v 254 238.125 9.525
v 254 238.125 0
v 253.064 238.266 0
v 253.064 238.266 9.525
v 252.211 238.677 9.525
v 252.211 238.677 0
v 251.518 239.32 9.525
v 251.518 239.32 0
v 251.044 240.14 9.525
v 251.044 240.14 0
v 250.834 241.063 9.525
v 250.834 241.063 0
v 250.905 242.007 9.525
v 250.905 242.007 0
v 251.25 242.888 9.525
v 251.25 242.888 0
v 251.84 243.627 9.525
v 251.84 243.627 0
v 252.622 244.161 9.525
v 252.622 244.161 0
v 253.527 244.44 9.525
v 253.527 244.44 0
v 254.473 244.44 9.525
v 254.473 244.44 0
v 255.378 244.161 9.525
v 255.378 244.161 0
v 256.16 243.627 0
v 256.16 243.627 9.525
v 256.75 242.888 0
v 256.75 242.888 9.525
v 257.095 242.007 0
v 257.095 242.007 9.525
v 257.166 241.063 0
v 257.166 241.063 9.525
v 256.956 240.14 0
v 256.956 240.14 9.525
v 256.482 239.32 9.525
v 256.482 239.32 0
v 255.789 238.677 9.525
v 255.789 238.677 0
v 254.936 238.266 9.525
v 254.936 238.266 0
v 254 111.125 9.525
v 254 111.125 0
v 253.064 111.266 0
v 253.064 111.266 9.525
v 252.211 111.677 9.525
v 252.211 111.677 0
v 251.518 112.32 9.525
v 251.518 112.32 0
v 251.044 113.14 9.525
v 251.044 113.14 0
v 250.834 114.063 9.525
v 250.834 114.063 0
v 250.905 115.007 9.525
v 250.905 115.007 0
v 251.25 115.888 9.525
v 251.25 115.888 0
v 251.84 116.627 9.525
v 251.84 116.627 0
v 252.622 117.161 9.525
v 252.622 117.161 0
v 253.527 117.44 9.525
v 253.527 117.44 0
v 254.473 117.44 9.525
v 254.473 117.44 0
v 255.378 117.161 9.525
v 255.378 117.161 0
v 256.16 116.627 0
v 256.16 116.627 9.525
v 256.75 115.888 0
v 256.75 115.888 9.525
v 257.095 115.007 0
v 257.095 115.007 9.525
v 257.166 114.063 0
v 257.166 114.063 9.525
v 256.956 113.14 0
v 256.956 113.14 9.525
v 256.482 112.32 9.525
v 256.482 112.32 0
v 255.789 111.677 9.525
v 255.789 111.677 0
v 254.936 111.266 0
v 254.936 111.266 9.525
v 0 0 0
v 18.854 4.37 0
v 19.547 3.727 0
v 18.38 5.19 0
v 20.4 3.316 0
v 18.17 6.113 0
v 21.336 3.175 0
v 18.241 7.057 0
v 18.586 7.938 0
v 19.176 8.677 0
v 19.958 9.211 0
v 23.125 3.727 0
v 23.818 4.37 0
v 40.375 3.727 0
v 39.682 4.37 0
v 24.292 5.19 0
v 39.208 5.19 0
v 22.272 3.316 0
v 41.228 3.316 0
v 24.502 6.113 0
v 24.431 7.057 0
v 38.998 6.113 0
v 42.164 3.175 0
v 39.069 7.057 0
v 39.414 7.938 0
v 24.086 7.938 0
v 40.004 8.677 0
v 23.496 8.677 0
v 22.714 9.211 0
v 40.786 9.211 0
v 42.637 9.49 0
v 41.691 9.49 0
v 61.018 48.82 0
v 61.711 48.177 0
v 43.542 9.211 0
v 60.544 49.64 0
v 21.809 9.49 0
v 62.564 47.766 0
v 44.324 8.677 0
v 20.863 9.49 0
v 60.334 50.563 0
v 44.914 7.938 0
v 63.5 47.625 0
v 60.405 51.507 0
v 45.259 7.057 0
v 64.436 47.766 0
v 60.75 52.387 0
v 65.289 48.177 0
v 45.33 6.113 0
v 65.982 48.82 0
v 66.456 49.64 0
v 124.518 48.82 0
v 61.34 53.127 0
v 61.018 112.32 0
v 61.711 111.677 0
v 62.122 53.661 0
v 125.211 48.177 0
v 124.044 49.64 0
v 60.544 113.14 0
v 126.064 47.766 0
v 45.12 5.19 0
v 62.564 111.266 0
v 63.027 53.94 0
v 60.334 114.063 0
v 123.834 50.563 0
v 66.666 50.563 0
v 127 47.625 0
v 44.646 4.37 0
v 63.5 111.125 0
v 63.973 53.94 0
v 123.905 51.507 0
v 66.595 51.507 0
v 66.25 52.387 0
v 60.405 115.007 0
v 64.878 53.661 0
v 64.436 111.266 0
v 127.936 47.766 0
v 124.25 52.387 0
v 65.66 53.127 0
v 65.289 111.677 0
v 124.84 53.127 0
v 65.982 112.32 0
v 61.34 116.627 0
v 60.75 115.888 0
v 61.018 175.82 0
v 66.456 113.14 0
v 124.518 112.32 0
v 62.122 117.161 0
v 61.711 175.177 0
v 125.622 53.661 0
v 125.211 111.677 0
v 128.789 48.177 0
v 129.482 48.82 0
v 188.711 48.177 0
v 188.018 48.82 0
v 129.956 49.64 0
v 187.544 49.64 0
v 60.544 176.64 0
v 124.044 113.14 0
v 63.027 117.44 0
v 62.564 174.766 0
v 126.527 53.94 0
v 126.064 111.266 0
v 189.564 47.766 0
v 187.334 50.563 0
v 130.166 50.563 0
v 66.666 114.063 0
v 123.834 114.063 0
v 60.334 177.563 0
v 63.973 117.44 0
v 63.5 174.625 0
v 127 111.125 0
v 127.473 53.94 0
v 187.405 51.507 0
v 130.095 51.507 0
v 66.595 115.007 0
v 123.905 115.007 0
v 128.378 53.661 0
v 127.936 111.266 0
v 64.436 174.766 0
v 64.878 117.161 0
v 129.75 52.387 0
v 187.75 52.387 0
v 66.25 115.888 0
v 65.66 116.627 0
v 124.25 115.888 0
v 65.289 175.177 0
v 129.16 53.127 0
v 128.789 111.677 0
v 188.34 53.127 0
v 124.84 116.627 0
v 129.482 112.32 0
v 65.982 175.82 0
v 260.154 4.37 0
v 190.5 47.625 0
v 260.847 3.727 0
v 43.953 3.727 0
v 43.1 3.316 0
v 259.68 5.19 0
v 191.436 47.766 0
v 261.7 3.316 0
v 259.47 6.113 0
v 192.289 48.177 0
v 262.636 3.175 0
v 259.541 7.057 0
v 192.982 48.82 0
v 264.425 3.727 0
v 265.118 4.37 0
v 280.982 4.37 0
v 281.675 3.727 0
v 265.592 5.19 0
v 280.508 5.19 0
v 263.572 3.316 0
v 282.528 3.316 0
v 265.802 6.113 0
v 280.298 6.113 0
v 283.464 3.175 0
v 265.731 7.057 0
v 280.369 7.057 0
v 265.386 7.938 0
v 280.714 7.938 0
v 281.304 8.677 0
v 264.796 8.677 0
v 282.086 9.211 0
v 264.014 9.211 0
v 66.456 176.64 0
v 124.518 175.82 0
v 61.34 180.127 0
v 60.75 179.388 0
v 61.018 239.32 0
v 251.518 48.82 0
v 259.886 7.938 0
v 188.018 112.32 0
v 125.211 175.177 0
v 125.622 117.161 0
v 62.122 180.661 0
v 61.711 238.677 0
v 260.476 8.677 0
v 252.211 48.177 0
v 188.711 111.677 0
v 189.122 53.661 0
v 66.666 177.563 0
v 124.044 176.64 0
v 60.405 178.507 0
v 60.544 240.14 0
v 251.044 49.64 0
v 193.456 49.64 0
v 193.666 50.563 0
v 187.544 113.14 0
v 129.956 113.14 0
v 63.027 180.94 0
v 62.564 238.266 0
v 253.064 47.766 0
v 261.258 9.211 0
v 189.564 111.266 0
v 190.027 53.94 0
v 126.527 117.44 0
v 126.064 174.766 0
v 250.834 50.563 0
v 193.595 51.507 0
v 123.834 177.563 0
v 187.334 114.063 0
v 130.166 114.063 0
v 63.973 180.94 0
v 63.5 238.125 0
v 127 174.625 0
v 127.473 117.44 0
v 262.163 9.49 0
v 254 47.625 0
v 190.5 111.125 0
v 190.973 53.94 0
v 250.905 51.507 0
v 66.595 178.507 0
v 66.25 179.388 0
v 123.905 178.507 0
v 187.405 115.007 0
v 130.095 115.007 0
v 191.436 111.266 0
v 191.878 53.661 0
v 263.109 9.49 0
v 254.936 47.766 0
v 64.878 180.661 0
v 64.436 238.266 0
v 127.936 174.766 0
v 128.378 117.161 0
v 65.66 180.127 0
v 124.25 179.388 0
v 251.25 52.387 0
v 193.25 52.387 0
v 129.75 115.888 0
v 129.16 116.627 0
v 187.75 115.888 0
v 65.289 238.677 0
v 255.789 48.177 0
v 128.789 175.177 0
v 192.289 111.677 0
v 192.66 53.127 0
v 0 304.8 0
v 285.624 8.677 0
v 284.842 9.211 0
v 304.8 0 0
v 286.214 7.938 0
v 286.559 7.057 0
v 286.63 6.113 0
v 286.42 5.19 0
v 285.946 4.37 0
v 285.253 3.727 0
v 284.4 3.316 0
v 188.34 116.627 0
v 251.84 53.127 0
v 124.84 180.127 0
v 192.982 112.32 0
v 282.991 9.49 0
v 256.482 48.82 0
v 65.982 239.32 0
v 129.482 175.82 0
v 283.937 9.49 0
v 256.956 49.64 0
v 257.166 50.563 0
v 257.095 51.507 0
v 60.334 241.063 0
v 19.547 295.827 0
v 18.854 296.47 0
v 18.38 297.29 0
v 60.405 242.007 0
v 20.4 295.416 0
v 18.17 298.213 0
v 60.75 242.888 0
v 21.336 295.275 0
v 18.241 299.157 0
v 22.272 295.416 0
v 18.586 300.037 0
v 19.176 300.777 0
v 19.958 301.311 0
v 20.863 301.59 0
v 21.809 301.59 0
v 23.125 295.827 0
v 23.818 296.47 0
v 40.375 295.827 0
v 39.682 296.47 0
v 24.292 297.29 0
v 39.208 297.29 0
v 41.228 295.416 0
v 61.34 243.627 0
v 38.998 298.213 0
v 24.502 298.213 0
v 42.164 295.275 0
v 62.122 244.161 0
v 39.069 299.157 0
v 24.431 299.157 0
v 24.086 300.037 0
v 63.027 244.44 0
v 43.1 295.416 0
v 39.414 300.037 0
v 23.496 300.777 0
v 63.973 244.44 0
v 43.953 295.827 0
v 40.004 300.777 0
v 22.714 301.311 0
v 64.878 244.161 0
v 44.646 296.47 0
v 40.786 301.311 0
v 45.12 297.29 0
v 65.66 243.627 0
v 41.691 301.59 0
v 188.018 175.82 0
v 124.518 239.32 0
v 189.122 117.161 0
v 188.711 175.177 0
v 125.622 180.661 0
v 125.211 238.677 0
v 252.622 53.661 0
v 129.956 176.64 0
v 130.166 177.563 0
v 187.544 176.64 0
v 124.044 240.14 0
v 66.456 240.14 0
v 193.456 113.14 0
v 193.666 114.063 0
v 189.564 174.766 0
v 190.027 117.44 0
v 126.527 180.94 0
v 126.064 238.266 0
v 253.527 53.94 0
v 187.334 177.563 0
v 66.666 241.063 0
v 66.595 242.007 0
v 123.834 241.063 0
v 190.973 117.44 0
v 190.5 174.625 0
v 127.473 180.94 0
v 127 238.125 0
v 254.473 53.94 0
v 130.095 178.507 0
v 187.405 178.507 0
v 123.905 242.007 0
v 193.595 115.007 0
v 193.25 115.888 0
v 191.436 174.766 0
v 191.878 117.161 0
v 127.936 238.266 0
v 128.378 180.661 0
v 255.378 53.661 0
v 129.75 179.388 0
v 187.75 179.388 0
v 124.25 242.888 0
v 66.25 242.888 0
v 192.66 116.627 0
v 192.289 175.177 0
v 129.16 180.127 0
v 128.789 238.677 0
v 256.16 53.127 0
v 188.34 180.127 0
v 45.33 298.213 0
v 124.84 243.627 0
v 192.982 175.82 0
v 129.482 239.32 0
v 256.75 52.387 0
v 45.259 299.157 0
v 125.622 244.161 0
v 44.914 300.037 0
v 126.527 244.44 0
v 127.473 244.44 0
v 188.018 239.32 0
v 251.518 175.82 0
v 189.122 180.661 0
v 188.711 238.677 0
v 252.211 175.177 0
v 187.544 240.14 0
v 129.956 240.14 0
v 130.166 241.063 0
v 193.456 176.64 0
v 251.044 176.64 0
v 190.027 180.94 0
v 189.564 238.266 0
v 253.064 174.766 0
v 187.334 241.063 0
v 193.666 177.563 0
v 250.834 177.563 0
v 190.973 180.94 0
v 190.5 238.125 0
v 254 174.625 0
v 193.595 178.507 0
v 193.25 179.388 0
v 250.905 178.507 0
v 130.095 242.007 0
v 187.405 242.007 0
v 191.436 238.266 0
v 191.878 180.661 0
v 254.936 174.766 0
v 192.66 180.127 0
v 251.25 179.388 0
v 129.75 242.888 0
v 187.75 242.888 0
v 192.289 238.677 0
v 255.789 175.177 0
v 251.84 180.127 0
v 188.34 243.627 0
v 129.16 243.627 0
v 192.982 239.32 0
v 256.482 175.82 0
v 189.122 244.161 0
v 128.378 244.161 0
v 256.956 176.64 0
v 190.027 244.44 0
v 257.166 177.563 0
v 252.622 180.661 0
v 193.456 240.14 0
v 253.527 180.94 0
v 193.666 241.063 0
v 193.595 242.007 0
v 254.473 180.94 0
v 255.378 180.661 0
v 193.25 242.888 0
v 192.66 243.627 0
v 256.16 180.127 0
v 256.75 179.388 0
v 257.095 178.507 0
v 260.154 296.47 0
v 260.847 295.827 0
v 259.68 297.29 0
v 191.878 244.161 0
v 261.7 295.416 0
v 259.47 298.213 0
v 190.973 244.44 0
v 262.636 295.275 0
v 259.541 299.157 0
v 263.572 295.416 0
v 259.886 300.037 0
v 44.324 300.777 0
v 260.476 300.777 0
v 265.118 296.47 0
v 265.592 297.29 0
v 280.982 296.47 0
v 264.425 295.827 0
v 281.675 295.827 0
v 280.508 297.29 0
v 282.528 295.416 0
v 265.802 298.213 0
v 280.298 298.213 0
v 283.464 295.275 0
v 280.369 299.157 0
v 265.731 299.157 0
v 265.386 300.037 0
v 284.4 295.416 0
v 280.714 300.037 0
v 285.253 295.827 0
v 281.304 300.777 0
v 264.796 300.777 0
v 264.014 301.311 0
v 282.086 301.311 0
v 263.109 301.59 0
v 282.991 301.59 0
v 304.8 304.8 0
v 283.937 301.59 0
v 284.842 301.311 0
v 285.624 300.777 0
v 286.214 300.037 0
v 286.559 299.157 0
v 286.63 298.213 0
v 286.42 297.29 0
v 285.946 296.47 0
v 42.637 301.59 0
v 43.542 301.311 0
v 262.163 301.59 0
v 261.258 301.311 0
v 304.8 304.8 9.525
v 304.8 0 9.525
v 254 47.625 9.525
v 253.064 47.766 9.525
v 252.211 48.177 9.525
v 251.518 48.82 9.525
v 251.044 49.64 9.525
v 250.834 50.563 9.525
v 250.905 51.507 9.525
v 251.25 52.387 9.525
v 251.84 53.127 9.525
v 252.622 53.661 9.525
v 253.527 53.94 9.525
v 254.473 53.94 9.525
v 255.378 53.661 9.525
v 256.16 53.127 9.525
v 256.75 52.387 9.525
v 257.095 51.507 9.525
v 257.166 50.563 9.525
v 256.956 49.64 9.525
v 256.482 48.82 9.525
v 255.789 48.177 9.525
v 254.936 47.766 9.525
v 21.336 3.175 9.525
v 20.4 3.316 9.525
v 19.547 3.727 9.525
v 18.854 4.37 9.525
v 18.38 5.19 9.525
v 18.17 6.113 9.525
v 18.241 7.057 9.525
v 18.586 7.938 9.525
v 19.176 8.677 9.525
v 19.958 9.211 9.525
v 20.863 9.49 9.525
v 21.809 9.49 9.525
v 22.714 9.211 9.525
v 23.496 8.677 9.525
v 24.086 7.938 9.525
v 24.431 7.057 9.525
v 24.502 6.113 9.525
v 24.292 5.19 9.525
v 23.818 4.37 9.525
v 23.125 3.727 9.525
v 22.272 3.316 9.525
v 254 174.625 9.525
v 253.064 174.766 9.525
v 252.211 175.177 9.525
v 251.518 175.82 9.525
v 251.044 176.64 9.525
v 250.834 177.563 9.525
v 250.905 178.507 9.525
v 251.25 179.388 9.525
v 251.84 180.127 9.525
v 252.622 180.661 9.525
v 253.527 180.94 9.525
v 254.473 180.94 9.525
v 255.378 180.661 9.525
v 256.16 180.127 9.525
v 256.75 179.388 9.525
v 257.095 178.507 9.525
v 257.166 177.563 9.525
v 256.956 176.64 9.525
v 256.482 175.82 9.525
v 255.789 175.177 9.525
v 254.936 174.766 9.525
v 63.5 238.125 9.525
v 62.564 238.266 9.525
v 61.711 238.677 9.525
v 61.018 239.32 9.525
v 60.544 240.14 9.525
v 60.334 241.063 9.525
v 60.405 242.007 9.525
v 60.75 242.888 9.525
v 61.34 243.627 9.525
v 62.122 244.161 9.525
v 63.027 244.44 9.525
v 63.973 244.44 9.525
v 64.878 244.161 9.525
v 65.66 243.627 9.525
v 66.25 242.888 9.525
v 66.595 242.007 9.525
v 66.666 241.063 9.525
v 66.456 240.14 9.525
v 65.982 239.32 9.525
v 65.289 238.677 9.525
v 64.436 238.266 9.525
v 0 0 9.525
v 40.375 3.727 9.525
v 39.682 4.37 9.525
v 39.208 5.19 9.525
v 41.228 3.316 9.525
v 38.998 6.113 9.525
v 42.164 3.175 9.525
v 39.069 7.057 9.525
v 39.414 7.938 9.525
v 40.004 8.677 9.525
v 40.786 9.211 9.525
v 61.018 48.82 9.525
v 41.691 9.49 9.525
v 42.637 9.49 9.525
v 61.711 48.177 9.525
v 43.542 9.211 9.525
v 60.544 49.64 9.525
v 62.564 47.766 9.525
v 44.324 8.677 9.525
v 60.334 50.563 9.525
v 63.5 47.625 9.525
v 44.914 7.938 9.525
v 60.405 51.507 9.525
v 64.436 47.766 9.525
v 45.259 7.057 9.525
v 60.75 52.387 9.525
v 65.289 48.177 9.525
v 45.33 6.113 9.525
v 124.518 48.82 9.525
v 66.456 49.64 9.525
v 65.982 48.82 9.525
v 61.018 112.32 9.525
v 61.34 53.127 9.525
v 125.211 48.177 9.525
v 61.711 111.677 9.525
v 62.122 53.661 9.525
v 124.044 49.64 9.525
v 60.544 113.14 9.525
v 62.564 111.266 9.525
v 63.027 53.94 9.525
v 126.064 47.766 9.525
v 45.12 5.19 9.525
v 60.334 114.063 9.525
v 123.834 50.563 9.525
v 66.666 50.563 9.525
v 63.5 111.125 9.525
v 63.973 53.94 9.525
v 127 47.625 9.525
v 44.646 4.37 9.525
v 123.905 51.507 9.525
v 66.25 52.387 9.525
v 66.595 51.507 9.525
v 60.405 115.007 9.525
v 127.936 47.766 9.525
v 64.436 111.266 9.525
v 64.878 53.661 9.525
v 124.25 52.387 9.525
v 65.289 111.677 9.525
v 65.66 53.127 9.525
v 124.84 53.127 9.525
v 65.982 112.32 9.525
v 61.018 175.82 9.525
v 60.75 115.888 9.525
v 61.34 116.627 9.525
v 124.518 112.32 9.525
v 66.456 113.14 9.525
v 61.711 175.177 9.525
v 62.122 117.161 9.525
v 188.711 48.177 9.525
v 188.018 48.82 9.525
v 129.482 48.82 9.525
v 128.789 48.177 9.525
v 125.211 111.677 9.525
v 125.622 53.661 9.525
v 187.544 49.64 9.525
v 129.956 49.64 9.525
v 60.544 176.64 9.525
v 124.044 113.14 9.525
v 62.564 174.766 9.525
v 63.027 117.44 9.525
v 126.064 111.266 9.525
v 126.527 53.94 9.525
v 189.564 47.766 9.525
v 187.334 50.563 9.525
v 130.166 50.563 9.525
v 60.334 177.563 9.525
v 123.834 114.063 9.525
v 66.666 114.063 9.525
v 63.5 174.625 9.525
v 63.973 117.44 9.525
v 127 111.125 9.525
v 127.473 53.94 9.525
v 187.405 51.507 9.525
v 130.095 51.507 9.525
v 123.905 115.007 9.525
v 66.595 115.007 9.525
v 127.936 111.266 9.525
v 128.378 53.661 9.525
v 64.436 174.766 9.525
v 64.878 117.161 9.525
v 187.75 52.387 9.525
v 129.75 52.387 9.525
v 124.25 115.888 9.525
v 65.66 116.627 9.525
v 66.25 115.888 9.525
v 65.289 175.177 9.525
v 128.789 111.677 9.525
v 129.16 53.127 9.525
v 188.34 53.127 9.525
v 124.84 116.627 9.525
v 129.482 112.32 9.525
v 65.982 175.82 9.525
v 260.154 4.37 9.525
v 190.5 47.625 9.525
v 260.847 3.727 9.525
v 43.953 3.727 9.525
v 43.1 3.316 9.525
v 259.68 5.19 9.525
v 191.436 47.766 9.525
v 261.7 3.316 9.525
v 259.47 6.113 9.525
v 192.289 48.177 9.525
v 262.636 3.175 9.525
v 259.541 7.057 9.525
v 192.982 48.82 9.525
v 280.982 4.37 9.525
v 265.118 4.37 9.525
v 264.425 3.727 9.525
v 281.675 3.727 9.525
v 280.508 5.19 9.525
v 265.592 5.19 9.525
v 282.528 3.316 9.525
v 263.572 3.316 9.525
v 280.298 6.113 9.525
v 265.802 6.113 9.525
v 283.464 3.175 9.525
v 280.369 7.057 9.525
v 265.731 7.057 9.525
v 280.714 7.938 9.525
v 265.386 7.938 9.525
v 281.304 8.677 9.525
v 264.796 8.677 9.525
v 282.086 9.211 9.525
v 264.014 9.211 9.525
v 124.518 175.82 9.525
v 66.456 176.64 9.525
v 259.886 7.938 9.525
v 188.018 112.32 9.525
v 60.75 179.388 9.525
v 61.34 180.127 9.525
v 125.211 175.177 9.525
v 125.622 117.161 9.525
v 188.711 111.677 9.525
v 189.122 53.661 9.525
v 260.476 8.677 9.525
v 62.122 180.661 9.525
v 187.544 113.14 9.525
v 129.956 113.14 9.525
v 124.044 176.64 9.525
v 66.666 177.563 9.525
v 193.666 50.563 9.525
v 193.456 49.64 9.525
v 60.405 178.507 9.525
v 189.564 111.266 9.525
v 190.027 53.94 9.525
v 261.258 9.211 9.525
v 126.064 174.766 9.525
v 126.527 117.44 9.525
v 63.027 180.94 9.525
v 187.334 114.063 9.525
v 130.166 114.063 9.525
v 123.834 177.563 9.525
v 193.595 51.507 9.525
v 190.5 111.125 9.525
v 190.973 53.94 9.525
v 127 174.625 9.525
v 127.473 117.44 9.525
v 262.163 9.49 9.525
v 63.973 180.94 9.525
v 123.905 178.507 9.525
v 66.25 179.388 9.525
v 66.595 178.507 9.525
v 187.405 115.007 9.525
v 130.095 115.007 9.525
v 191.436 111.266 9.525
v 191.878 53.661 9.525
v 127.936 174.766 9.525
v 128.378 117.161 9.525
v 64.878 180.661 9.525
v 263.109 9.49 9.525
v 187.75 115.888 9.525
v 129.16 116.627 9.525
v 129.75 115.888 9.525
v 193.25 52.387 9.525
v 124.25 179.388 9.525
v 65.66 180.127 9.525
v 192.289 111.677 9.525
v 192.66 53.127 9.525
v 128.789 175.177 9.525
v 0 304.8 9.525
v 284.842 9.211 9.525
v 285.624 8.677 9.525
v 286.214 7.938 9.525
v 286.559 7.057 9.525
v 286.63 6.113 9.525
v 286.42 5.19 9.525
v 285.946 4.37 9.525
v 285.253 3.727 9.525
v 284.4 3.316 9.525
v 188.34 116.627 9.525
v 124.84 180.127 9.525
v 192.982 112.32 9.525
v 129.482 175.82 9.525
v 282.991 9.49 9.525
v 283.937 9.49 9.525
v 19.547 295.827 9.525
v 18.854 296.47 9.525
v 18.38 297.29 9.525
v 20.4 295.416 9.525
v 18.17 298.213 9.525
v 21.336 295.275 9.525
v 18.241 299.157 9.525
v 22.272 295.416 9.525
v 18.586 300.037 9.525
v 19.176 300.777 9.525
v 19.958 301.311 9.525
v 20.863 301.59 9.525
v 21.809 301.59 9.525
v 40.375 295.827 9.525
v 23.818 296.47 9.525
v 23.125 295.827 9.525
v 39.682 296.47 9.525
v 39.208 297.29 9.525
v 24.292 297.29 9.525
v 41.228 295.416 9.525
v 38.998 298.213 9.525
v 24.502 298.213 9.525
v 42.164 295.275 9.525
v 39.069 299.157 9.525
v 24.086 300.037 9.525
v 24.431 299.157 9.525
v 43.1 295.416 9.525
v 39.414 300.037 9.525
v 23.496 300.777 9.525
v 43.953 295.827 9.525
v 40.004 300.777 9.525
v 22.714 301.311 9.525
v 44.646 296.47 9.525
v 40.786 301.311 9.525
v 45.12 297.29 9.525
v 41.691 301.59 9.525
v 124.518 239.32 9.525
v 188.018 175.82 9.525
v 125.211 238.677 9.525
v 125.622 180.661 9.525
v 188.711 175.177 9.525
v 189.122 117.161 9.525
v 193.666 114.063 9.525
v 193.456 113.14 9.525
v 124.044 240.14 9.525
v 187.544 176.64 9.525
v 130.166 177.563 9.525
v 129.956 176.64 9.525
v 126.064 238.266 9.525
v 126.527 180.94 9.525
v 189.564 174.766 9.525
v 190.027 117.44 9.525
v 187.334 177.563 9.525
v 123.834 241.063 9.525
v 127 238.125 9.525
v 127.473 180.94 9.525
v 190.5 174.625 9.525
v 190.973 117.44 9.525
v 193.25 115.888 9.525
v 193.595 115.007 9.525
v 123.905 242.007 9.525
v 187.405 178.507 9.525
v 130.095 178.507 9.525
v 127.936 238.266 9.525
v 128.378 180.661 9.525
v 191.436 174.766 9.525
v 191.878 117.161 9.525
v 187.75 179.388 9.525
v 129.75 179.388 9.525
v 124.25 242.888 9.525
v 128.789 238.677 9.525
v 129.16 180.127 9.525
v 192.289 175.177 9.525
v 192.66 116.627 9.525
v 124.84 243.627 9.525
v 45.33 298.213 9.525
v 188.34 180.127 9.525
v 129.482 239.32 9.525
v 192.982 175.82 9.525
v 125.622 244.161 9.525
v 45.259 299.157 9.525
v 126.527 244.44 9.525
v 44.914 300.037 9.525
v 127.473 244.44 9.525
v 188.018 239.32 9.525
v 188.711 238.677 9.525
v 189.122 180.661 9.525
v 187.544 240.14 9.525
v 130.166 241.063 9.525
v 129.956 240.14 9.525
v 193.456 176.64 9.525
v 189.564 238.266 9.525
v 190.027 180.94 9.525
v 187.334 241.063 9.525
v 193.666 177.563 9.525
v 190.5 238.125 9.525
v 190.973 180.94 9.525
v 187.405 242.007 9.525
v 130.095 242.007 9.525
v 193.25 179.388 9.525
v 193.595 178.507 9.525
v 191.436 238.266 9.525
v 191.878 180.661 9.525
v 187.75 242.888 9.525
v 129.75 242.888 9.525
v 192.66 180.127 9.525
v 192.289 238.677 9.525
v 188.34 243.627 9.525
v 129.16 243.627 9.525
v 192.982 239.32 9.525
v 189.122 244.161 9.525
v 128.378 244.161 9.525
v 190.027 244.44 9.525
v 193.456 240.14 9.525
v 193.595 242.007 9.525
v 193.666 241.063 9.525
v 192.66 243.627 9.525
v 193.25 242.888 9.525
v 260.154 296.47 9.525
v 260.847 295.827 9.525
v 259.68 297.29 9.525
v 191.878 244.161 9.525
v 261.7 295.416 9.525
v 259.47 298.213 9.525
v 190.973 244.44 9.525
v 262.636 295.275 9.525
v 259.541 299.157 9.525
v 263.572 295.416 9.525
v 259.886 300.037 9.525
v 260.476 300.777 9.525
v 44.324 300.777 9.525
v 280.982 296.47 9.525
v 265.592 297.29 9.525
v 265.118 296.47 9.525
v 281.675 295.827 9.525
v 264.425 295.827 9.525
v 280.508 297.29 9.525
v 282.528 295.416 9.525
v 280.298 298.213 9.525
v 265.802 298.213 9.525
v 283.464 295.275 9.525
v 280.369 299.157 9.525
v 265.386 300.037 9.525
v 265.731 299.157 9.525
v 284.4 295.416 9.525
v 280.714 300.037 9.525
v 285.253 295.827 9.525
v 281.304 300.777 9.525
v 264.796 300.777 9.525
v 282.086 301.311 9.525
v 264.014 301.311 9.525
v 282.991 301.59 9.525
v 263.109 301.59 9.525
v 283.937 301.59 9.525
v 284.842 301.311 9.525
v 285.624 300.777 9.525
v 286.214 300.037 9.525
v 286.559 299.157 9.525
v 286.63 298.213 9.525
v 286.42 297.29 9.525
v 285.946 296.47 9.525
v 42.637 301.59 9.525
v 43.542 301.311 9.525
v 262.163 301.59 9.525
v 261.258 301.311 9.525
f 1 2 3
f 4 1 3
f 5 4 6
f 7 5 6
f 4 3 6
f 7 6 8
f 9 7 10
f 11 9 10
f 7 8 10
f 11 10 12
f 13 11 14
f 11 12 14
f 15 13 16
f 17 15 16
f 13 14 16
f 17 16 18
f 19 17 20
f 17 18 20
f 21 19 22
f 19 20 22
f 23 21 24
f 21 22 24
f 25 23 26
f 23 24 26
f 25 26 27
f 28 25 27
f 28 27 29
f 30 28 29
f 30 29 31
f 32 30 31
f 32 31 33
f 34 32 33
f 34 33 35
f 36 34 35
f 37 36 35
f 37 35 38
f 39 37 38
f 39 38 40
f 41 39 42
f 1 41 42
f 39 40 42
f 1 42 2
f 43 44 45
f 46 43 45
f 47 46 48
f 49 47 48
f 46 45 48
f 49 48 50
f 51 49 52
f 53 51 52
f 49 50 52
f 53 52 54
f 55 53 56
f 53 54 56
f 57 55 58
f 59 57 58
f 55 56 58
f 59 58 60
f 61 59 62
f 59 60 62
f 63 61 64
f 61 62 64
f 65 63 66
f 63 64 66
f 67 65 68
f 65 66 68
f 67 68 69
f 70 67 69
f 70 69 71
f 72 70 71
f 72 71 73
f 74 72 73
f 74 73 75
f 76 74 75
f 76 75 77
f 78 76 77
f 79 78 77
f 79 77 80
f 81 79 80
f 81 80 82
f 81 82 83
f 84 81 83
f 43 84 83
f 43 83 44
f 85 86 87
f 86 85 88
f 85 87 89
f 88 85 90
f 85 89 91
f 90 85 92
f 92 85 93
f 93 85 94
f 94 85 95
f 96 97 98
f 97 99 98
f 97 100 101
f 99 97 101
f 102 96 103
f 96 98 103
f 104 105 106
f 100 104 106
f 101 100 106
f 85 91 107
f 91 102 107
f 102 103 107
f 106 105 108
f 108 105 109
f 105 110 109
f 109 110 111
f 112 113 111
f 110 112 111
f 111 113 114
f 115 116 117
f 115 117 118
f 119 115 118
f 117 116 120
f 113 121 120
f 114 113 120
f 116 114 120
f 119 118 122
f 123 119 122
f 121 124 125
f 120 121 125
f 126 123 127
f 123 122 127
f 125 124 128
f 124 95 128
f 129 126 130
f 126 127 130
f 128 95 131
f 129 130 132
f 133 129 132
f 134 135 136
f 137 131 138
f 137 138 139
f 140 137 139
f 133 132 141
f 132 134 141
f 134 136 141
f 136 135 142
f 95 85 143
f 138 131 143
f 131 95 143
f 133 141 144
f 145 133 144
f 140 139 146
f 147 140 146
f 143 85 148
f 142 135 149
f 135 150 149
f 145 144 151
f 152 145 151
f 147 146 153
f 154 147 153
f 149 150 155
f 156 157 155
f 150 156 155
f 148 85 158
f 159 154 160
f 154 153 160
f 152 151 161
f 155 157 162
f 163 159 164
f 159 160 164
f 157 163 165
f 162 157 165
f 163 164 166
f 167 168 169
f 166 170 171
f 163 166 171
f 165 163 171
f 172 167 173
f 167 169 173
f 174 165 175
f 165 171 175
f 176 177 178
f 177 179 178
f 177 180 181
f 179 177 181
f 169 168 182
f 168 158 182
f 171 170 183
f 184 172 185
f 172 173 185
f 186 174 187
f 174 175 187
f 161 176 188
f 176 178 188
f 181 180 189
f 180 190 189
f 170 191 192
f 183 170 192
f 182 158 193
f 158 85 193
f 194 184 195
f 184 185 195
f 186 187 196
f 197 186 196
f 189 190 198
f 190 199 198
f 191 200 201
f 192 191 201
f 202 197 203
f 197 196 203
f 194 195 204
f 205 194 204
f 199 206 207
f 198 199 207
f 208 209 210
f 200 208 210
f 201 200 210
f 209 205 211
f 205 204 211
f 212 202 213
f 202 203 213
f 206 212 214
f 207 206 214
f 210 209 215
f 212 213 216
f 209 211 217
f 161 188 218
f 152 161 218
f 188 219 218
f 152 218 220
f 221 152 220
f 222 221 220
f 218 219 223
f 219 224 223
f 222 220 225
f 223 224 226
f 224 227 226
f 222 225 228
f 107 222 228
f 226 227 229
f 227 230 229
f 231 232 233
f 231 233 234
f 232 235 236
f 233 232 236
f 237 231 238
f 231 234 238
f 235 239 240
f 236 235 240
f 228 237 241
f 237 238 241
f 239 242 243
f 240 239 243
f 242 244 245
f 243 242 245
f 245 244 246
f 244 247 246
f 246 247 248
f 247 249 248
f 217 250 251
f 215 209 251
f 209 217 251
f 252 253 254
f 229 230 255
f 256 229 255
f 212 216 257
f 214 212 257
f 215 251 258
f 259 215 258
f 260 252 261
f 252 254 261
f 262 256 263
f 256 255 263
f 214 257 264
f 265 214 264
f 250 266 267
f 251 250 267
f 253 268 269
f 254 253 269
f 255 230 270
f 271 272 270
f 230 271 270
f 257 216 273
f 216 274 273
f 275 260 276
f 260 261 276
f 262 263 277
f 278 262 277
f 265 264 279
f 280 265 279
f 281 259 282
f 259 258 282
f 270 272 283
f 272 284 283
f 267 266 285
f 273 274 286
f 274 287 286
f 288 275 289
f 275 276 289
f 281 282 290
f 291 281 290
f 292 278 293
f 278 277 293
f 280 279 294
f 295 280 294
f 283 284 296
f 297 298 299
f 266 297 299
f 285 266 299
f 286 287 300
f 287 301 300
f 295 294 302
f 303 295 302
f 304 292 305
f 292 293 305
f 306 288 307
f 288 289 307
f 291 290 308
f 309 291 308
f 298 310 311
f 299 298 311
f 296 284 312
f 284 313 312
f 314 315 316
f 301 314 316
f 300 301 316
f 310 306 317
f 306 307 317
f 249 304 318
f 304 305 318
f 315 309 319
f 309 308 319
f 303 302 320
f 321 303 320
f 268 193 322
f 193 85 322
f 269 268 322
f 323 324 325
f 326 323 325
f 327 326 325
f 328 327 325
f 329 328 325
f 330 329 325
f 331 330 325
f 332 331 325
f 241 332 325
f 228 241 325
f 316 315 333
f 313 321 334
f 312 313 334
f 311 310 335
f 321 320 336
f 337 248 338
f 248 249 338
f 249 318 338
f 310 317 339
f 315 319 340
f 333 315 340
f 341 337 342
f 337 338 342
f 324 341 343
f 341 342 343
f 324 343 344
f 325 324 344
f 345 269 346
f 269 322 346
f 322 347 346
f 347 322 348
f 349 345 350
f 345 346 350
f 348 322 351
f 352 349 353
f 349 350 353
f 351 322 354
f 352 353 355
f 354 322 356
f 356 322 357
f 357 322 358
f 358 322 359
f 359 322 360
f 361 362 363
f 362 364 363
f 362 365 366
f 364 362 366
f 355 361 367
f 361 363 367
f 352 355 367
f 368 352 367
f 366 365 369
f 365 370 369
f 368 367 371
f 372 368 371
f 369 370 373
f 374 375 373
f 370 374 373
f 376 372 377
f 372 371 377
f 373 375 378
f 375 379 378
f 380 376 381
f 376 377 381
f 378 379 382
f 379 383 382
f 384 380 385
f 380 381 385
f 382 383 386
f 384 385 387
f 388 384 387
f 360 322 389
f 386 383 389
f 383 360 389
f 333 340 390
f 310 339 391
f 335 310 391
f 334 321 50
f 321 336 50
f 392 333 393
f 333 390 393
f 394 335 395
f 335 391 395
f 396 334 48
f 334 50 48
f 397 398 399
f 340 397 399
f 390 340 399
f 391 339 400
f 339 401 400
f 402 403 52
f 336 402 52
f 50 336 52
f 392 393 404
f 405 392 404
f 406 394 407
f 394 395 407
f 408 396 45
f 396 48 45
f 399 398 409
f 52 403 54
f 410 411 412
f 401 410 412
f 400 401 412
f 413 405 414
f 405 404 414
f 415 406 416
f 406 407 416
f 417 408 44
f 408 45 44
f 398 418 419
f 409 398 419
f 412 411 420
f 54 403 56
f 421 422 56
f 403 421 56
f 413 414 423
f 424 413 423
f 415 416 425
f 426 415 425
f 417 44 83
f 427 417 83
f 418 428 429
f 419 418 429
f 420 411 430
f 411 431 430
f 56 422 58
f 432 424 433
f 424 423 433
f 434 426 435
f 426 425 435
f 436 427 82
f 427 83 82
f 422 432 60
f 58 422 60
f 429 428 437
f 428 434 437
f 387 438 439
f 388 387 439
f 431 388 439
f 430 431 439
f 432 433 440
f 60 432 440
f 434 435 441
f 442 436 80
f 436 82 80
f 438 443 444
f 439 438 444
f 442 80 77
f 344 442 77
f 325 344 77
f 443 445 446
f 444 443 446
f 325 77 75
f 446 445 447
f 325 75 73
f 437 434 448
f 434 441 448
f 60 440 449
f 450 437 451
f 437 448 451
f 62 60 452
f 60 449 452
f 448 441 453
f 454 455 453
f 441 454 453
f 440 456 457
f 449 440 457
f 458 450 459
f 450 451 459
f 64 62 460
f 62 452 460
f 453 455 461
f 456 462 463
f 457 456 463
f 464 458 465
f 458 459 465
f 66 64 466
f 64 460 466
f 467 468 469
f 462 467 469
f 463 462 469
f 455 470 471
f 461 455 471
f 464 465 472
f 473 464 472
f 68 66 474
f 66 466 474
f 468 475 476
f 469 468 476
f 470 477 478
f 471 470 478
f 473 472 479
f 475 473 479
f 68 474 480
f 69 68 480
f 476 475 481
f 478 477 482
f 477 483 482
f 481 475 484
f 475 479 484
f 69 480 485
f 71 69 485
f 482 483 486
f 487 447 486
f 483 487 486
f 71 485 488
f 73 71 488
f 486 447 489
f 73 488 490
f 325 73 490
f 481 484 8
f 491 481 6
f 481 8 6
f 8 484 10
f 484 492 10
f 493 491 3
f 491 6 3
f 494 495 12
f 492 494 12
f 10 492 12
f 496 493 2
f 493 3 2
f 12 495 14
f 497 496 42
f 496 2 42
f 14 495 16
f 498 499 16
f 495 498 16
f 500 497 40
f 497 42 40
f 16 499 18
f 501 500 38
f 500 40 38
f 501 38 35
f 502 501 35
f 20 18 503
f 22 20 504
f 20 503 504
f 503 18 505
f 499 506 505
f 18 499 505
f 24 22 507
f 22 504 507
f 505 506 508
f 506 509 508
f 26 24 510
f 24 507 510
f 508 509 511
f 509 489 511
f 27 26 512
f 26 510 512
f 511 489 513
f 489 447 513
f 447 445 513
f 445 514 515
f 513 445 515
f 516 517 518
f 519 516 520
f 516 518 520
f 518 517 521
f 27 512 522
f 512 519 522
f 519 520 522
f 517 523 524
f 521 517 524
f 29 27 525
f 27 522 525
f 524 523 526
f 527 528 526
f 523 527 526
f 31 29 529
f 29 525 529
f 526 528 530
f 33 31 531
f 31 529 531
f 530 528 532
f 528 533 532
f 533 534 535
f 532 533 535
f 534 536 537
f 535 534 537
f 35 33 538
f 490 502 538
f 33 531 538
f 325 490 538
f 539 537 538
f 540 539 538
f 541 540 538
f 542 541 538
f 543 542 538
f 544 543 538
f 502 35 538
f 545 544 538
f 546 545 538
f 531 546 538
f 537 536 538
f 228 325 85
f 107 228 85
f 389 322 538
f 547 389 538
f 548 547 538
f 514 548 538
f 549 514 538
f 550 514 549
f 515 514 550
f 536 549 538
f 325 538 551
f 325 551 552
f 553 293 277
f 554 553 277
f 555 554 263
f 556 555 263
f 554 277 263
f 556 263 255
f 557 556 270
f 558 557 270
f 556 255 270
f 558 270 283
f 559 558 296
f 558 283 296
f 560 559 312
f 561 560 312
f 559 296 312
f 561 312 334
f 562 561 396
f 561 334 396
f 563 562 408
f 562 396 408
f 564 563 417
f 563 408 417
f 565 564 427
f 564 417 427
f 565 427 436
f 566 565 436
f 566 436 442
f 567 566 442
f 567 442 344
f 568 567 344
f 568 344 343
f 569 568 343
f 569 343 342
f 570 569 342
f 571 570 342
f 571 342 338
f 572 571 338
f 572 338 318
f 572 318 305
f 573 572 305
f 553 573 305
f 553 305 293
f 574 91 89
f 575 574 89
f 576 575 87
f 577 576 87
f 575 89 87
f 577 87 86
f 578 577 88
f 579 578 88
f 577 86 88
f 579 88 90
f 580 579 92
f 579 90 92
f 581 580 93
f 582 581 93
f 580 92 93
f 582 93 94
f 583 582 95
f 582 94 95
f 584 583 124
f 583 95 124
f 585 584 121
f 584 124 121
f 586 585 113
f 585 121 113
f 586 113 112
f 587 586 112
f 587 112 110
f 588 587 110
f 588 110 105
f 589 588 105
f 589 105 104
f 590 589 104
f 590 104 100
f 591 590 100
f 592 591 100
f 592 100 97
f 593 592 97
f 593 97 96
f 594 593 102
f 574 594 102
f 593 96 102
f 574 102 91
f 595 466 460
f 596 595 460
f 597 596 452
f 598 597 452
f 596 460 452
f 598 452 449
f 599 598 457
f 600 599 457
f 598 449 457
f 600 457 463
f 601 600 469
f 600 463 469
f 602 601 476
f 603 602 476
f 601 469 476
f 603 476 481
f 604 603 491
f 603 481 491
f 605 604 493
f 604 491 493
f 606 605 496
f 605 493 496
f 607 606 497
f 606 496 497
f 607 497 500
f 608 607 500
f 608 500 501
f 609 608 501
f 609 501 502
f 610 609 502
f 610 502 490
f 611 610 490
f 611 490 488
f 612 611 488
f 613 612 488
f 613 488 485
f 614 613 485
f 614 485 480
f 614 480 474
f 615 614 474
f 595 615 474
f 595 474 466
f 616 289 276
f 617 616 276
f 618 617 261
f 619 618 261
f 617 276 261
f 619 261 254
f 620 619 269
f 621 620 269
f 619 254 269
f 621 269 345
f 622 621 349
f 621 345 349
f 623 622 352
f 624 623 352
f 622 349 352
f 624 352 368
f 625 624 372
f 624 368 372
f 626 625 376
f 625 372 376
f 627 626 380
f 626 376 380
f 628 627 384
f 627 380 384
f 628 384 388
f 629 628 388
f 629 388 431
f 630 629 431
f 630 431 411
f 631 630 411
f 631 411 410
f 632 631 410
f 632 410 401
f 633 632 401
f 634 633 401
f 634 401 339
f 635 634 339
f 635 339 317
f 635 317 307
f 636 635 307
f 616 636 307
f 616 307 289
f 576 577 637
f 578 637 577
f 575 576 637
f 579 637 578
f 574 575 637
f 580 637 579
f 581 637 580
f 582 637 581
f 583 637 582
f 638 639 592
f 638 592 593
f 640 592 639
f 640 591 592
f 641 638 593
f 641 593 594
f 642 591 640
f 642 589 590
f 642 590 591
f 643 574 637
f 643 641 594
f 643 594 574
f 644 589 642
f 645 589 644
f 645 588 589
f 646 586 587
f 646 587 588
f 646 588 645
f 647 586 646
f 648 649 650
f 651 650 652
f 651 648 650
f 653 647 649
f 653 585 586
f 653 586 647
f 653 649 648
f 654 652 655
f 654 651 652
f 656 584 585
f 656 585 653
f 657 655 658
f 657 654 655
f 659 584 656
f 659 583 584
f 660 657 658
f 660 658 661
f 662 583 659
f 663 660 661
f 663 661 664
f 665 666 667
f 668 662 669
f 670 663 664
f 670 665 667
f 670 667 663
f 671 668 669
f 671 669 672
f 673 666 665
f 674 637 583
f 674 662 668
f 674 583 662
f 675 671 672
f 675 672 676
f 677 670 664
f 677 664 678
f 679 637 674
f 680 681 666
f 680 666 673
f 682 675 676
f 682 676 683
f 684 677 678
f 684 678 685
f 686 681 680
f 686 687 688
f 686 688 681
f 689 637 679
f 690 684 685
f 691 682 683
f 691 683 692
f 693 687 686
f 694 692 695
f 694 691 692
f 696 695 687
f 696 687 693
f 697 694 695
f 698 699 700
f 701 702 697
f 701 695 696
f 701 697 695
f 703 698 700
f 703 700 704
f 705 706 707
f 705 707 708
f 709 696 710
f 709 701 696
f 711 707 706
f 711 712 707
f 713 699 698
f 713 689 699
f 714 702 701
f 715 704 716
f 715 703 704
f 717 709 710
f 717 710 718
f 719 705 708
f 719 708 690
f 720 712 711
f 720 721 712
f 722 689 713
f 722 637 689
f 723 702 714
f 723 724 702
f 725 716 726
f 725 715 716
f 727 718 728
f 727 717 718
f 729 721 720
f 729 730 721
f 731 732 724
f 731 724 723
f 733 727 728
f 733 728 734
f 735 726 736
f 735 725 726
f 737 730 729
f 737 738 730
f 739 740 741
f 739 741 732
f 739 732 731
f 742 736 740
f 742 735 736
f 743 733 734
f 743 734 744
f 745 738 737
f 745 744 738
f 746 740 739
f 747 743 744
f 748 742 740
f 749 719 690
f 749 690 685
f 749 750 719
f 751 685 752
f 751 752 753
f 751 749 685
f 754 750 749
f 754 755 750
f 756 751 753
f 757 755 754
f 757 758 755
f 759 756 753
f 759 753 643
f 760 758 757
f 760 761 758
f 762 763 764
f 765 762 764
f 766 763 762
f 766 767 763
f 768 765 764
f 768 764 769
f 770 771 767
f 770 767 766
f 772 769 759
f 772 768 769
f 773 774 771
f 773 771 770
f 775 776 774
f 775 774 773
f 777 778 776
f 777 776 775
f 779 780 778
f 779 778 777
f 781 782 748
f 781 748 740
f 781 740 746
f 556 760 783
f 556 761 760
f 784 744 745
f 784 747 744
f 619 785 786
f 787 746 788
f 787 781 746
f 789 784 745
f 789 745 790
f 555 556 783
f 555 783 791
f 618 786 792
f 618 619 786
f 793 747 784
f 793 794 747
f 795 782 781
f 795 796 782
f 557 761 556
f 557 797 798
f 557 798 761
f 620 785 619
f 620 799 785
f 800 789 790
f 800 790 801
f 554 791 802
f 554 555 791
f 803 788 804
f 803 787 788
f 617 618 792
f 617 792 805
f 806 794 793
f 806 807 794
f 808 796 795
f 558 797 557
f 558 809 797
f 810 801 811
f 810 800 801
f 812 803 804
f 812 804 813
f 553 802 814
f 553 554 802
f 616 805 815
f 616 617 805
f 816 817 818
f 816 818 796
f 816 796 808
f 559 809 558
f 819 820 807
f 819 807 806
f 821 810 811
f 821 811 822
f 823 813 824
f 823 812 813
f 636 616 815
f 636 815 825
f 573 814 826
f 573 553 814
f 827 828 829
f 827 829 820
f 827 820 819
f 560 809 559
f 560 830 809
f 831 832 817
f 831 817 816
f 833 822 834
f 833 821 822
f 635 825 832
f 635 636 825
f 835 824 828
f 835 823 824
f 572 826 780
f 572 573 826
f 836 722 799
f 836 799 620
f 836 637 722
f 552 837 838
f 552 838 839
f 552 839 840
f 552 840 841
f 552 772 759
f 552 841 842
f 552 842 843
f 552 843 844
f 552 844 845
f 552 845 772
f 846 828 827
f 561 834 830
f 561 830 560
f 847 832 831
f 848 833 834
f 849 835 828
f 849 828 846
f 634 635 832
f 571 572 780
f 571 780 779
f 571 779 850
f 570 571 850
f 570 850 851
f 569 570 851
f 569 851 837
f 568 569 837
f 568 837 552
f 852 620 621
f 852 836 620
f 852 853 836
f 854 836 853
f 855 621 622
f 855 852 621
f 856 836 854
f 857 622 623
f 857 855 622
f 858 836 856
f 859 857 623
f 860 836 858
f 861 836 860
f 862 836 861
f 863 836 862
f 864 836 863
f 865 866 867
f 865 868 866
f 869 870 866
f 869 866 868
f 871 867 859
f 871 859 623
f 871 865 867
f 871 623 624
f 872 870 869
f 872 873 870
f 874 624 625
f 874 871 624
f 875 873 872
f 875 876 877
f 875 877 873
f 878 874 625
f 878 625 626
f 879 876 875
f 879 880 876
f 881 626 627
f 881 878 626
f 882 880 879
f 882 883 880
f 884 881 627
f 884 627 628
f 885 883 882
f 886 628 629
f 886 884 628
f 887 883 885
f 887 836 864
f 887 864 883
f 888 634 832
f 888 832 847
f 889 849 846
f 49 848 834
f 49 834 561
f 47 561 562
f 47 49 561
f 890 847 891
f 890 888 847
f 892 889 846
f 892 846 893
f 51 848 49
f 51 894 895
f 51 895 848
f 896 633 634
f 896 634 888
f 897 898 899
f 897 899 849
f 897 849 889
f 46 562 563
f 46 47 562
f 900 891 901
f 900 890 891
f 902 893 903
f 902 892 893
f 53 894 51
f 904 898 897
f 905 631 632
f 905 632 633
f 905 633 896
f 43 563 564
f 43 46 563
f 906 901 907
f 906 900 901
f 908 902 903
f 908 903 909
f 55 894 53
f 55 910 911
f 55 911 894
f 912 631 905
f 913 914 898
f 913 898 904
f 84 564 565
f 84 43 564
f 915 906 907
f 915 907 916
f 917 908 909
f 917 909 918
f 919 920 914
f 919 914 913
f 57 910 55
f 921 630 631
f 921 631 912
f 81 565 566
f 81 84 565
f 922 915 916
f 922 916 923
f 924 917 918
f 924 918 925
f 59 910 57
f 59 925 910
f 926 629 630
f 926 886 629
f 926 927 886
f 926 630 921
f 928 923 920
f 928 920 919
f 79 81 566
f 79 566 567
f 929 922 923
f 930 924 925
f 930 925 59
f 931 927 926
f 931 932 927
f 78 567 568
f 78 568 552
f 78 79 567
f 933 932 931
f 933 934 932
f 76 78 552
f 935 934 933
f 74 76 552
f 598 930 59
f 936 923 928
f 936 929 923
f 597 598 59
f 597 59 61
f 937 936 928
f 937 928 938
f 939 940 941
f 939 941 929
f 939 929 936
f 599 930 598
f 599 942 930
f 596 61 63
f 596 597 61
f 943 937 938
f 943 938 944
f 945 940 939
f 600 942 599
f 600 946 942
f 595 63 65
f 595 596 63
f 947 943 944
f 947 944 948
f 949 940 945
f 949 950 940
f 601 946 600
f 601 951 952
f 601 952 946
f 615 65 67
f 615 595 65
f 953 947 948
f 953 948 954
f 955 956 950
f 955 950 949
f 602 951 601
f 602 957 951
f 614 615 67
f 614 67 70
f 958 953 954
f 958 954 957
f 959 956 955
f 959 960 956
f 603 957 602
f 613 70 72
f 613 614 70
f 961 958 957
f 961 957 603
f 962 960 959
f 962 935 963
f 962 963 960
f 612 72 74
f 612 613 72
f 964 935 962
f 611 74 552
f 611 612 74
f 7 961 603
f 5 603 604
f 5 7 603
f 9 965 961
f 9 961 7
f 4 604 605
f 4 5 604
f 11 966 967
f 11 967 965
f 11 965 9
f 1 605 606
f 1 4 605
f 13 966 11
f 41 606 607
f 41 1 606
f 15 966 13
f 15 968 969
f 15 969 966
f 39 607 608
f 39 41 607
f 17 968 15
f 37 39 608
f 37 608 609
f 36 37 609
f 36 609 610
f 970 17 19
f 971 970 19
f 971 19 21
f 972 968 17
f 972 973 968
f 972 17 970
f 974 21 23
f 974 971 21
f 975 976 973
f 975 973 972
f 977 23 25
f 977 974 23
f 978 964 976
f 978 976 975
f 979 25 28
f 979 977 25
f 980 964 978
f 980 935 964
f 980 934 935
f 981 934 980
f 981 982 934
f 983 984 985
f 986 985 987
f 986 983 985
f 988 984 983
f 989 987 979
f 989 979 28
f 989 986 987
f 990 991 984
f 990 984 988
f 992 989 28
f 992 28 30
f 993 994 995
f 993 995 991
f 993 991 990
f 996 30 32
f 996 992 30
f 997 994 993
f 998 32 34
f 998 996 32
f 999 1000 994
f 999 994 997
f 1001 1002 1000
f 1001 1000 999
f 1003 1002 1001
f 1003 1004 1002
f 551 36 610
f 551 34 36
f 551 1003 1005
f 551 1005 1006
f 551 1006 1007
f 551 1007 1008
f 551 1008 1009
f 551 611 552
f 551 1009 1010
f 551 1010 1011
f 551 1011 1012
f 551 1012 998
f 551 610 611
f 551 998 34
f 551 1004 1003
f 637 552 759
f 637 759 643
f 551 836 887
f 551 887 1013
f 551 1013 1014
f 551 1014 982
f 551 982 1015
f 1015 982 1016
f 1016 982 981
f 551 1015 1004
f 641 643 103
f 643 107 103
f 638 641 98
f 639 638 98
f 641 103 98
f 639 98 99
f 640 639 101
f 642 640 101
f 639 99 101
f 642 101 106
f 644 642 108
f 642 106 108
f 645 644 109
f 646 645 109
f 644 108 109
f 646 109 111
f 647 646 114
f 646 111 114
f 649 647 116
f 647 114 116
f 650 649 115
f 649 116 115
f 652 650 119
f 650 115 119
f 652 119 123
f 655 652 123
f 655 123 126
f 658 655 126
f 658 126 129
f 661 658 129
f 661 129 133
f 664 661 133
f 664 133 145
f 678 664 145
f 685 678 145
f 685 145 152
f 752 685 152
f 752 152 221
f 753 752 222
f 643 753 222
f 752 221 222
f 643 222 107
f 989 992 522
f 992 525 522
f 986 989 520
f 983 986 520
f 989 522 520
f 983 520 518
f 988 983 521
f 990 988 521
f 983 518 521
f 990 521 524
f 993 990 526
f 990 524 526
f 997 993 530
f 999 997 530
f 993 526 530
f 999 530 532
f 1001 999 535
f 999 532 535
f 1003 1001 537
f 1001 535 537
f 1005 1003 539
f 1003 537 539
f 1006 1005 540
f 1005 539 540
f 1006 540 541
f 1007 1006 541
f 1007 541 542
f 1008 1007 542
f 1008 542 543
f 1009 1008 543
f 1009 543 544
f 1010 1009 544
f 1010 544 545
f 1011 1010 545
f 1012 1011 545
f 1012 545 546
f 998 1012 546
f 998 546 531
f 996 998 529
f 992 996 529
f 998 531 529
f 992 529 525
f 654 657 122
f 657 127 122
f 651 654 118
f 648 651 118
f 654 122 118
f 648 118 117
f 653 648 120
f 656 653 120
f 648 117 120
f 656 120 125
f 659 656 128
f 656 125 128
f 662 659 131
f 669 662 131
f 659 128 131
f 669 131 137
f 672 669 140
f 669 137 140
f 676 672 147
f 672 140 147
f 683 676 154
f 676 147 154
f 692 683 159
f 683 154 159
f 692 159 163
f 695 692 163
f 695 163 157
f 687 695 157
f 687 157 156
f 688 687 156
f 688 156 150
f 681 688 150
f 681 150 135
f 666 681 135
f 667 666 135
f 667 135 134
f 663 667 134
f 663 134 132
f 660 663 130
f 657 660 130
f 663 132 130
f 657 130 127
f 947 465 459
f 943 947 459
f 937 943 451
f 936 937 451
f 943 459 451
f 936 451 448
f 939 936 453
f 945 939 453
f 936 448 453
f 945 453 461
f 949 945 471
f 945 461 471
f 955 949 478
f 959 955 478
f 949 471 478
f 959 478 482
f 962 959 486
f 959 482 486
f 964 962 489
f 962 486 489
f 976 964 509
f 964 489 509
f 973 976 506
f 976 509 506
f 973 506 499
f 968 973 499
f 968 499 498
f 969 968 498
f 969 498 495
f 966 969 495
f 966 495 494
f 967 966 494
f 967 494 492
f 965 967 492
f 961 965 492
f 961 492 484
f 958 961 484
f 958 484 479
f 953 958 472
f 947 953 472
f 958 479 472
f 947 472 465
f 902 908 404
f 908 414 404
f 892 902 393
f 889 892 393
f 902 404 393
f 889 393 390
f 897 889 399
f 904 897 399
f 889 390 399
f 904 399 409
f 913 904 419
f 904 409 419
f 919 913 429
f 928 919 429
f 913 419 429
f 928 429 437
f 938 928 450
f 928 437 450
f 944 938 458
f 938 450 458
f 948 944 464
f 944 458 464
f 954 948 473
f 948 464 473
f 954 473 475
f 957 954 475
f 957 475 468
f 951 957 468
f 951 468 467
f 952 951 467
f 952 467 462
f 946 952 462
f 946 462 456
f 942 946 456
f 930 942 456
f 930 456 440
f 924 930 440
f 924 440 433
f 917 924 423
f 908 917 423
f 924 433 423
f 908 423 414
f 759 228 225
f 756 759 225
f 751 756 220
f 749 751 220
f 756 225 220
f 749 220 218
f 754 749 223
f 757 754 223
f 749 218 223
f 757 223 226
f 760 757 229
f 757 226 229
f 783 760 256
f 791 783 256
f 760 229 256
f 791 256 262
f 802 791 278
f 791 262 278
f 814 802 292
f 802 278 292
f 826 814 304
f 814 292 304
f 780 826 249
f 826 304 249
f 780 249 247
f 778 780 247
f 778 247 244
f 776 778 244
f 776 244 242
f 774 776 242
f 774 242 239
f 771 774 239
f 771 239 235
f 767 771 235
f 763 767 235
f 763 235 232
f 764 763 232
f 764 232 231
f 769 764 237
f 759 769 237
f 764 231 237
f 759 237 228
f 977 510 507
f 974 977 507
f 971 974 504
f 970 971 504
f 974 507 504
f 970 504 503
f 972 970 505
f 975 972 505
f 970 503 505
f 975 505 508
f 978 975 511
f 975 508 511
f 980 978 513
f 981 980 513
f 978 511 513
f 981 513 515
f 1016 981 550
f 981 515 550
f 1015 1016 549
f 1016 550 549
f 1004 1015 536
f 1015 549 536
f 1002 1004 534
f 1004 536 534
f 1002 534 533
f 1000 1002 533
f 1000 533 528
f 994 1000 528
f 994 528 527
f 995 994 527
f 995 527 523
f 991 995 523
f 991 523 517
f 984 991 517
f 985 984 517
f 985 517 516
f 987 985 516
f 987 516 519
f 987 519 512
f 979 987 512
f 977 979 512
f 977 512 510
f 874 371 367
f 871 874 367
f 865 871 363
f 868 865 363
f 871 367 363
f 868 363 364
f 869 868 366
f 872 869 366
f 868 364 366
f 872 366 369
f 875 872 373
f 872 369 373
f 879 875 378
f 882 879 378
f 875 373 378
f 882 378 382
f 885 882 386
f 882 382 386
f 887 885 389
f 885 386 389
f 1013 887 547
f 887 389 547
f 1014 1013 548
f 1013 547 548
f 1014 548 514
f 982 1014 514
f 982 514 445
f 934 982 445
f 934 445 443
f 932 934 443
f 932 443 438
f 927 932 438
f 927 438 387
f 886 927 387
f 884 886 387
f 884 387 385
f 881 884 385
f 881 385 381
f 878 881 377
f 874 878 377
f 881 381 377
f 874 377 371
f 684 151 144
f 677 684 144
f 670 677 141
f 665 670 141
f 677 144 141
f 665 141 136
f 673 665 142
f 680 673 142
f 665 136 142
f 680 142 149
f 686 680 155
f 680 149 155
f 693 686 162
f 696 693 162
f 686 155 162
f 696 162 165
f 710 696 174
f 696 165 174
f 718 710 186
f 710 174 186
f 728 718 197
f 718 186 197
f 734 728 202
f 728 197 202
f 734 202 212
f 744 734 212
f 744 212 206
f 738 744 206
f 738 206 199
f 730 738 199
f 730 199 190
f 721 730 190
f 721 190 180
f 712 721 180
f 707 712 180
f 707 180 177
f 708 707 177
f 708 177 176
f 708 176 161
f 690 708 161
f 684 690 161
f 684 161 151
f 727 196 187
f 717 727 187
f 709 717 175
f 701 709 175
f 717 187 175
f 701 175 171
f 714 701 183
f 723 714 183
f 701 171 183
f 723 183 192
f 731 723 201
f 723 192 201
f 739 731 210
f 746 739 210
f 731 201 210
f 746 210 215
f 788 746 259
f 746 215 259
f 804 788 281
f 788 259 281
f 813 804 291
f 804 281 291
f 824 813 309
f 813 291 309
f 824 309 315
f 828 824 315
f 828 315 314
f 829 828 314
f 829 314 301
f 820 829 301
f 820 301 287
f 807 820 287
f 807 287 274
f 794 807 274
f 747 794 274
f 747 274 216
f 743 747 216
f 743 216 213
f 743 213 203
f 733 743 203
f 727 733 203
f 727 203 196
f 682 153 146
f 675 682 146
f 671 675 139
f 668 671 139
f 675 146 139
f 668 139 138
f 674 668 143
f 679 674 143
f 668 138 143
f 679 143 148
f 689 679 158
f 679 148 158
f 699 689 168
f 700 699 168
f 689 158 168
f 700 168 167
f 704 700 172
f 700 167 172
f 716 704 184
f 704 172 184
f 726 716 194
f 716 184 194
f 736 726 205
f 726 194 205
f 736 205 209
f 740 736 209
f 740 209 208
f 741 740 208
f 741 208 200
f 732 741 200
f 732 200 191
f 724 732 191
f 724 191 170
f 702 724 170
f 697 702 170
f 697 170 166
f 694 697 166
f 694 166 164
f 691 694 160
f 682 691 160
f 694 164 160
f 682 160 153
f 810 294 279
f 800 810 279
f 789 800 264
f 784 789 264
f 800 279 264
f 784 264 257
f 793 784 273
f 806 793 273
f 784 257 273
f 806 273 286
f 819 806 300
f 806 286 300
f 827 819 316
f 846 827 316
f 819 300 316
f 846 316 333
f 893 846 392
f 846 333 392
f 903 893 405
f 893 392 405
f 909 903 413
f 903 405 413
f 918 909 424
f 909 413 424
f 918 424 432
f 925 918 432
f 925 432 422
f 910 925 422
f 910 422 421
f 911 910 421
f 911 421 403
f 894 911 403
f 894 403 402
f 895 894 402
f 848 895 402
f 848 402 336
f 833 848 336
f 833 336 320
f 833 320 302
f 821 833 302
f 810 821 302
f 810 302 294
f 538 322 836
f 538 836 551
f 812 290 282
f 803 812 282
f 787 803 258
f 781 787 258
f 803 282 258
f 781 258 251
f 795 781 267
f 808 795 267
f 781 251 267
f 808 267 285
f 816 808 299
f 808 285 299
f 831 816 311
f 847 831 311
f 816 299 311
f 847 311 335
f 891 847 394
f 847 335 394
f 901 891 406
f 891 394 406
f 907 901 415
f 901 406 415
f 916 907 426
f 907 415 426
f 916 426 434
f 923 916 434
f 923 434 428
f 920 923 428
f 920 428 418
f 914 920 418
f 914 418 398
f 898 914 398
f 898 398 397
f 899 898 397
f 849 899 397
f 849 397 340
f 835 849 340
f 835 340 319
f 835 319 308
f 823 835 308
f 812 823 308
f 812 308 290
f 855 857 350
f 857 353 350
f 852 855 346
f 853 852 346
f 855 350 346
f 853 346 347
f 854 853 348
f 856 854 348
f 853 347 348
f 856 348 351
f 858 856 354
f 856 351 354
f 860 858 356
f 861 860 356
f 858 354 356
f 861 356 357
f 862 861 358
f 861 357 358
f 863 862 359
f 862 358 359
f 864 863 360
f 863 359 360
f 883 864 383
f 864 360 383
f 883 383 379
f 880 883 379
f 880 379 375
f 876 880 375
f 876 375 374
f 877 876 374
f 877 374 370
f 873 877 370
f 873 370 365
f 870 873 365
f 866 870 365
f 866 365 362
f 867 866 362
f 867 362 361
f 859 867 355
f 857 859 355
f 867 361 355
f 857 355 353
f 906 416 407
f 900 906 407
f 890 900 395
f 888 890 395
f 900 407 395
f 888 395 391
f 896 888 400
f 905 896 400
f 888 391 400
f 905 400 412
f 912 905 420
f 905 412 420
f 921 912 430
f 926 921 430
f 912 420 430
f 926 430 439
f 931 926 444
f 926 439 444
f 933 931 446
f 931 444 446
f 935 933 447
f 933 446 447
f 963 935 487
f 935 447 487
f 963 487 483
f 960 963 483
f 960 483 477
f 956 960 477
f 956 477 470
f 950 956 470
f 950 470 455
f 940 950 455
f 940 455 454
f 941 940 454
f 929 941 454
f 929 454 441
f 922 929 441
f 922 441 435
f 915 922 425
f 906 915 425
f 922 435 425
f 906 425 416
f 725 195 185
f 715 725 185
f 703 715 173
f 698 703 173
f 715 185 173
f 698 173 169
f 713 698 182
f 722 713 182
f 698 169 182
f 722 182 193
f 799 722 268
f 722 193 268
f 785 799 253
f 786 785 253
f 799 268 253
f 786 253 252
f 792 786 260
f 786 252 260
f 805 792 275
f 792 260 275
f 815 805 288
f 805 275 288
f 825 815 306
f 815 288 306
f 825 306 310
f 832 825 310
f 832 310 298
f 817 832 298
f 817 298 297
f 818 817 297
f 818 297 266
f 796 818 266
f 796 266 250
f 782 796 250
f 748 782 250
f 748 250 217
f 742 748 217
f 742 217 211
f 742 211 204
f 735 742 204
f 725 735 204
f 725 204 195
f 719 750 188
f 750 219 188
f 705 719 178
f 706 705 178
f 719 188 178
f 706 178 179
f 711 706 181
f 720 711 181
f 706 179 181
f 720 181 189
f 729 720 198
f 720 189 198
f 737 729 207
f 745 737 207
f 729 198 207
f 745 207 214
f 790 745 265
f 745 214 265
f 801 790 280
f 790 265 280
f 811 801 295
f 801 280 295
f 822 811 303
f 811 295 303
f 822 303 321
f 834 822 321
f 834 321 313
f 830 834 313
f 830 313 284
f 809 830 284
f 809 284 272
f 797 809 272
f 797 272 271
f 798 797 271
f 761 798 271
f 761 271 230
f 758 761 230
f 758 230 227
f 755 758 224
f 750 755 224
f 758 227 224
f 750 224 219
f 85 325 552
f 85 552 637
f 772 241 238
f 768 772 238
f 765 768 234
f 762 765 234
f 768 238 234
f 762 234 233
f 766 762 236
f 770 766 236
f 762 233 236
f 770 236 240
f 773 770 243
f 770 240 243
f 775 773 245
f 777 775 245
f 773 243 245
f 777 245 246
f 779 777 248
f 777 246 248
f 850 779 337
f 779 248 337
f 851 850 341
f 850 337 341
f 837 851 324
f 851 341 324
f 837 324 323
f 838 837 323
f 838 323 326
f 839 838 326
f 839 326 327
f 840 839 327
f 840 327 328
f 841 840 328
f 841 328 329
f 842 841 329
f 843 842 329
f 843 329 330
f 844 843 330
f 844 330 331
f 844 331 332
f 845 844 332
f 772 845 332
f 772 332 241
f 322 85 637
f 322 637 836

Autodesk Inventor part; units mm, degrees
ref_plane "YZ Plane" through (0, 0, 0) normal (1, 0, 0) x (0, 1, 0)
ref_plane "XZ Plane" through (0, 0, 0) normal (0, 1, 0) x (-1, 0, 0)
ref_plane "XY Plane" through (0, 0, 0) normal (0, 0, 1) x (1, 0, 0)
sketch "Sketch1" plane through (0, 0, 0) normal (0, 0, 1) x (1, 0, 0)
  line L0 (0, 304.8) -> (304.8, 304.8)
  line L1 (304.8, 304.8) -> (304.8, 0)
  line L2 (304.8, 0) -> (0, 0)
  line L3 (0, 0) -> (0, 304.8)
  dimension "d0" = 304.8
  dimension "d1" = 304.8
extrude "Extrusion1" add sketch "Sketch1" along normal blind 9.525
hole "Hole1" at (21.336, 298.45, 9.525) direction (0, 0, -1) diameter 6.35 end through all
hole "Hole2" at (42.164, 298.45, 9.525) direction (0, 0, -1) diameter 6.35 end through all
hole "Hole3" at (262.636, 298.45, 9.525) direction (0, 0, -1) diameter 6.35 end through all
hole "Hole4" at (283.464, 298.45, 9.525) direction (0, 0, -1) diameter 6.35 end through all
hole "Hole5" at (21.336, 6.35, 9.525) direction (0, 0, -1) diameter 6.35 end through all
hole "Hole6" at (42.164, 6.35, 9.525) direction (0, 0, -1) diameter 6.35 end through all
hole "Hole7" at (262.636, 6.35, 9.525) direction (0, 0, -1) diameter 6.35 end through all
hole "Hole8" at (283.464, 6.35, 9.525) direction (0, 0, -1) diameter 6.35 end through all
hole "Hole9" at (63.5, 241.3, 9.525) direction (0, 0, -1) diameter 6.35 end through all
pattern_linear "Rectangular Pattern1" count 4 spacing 63.5 along (1, 0, 0) count 4 spacing 63.5 along (0, -1, 0) of "Hole9"
properties part number "baseplate"
